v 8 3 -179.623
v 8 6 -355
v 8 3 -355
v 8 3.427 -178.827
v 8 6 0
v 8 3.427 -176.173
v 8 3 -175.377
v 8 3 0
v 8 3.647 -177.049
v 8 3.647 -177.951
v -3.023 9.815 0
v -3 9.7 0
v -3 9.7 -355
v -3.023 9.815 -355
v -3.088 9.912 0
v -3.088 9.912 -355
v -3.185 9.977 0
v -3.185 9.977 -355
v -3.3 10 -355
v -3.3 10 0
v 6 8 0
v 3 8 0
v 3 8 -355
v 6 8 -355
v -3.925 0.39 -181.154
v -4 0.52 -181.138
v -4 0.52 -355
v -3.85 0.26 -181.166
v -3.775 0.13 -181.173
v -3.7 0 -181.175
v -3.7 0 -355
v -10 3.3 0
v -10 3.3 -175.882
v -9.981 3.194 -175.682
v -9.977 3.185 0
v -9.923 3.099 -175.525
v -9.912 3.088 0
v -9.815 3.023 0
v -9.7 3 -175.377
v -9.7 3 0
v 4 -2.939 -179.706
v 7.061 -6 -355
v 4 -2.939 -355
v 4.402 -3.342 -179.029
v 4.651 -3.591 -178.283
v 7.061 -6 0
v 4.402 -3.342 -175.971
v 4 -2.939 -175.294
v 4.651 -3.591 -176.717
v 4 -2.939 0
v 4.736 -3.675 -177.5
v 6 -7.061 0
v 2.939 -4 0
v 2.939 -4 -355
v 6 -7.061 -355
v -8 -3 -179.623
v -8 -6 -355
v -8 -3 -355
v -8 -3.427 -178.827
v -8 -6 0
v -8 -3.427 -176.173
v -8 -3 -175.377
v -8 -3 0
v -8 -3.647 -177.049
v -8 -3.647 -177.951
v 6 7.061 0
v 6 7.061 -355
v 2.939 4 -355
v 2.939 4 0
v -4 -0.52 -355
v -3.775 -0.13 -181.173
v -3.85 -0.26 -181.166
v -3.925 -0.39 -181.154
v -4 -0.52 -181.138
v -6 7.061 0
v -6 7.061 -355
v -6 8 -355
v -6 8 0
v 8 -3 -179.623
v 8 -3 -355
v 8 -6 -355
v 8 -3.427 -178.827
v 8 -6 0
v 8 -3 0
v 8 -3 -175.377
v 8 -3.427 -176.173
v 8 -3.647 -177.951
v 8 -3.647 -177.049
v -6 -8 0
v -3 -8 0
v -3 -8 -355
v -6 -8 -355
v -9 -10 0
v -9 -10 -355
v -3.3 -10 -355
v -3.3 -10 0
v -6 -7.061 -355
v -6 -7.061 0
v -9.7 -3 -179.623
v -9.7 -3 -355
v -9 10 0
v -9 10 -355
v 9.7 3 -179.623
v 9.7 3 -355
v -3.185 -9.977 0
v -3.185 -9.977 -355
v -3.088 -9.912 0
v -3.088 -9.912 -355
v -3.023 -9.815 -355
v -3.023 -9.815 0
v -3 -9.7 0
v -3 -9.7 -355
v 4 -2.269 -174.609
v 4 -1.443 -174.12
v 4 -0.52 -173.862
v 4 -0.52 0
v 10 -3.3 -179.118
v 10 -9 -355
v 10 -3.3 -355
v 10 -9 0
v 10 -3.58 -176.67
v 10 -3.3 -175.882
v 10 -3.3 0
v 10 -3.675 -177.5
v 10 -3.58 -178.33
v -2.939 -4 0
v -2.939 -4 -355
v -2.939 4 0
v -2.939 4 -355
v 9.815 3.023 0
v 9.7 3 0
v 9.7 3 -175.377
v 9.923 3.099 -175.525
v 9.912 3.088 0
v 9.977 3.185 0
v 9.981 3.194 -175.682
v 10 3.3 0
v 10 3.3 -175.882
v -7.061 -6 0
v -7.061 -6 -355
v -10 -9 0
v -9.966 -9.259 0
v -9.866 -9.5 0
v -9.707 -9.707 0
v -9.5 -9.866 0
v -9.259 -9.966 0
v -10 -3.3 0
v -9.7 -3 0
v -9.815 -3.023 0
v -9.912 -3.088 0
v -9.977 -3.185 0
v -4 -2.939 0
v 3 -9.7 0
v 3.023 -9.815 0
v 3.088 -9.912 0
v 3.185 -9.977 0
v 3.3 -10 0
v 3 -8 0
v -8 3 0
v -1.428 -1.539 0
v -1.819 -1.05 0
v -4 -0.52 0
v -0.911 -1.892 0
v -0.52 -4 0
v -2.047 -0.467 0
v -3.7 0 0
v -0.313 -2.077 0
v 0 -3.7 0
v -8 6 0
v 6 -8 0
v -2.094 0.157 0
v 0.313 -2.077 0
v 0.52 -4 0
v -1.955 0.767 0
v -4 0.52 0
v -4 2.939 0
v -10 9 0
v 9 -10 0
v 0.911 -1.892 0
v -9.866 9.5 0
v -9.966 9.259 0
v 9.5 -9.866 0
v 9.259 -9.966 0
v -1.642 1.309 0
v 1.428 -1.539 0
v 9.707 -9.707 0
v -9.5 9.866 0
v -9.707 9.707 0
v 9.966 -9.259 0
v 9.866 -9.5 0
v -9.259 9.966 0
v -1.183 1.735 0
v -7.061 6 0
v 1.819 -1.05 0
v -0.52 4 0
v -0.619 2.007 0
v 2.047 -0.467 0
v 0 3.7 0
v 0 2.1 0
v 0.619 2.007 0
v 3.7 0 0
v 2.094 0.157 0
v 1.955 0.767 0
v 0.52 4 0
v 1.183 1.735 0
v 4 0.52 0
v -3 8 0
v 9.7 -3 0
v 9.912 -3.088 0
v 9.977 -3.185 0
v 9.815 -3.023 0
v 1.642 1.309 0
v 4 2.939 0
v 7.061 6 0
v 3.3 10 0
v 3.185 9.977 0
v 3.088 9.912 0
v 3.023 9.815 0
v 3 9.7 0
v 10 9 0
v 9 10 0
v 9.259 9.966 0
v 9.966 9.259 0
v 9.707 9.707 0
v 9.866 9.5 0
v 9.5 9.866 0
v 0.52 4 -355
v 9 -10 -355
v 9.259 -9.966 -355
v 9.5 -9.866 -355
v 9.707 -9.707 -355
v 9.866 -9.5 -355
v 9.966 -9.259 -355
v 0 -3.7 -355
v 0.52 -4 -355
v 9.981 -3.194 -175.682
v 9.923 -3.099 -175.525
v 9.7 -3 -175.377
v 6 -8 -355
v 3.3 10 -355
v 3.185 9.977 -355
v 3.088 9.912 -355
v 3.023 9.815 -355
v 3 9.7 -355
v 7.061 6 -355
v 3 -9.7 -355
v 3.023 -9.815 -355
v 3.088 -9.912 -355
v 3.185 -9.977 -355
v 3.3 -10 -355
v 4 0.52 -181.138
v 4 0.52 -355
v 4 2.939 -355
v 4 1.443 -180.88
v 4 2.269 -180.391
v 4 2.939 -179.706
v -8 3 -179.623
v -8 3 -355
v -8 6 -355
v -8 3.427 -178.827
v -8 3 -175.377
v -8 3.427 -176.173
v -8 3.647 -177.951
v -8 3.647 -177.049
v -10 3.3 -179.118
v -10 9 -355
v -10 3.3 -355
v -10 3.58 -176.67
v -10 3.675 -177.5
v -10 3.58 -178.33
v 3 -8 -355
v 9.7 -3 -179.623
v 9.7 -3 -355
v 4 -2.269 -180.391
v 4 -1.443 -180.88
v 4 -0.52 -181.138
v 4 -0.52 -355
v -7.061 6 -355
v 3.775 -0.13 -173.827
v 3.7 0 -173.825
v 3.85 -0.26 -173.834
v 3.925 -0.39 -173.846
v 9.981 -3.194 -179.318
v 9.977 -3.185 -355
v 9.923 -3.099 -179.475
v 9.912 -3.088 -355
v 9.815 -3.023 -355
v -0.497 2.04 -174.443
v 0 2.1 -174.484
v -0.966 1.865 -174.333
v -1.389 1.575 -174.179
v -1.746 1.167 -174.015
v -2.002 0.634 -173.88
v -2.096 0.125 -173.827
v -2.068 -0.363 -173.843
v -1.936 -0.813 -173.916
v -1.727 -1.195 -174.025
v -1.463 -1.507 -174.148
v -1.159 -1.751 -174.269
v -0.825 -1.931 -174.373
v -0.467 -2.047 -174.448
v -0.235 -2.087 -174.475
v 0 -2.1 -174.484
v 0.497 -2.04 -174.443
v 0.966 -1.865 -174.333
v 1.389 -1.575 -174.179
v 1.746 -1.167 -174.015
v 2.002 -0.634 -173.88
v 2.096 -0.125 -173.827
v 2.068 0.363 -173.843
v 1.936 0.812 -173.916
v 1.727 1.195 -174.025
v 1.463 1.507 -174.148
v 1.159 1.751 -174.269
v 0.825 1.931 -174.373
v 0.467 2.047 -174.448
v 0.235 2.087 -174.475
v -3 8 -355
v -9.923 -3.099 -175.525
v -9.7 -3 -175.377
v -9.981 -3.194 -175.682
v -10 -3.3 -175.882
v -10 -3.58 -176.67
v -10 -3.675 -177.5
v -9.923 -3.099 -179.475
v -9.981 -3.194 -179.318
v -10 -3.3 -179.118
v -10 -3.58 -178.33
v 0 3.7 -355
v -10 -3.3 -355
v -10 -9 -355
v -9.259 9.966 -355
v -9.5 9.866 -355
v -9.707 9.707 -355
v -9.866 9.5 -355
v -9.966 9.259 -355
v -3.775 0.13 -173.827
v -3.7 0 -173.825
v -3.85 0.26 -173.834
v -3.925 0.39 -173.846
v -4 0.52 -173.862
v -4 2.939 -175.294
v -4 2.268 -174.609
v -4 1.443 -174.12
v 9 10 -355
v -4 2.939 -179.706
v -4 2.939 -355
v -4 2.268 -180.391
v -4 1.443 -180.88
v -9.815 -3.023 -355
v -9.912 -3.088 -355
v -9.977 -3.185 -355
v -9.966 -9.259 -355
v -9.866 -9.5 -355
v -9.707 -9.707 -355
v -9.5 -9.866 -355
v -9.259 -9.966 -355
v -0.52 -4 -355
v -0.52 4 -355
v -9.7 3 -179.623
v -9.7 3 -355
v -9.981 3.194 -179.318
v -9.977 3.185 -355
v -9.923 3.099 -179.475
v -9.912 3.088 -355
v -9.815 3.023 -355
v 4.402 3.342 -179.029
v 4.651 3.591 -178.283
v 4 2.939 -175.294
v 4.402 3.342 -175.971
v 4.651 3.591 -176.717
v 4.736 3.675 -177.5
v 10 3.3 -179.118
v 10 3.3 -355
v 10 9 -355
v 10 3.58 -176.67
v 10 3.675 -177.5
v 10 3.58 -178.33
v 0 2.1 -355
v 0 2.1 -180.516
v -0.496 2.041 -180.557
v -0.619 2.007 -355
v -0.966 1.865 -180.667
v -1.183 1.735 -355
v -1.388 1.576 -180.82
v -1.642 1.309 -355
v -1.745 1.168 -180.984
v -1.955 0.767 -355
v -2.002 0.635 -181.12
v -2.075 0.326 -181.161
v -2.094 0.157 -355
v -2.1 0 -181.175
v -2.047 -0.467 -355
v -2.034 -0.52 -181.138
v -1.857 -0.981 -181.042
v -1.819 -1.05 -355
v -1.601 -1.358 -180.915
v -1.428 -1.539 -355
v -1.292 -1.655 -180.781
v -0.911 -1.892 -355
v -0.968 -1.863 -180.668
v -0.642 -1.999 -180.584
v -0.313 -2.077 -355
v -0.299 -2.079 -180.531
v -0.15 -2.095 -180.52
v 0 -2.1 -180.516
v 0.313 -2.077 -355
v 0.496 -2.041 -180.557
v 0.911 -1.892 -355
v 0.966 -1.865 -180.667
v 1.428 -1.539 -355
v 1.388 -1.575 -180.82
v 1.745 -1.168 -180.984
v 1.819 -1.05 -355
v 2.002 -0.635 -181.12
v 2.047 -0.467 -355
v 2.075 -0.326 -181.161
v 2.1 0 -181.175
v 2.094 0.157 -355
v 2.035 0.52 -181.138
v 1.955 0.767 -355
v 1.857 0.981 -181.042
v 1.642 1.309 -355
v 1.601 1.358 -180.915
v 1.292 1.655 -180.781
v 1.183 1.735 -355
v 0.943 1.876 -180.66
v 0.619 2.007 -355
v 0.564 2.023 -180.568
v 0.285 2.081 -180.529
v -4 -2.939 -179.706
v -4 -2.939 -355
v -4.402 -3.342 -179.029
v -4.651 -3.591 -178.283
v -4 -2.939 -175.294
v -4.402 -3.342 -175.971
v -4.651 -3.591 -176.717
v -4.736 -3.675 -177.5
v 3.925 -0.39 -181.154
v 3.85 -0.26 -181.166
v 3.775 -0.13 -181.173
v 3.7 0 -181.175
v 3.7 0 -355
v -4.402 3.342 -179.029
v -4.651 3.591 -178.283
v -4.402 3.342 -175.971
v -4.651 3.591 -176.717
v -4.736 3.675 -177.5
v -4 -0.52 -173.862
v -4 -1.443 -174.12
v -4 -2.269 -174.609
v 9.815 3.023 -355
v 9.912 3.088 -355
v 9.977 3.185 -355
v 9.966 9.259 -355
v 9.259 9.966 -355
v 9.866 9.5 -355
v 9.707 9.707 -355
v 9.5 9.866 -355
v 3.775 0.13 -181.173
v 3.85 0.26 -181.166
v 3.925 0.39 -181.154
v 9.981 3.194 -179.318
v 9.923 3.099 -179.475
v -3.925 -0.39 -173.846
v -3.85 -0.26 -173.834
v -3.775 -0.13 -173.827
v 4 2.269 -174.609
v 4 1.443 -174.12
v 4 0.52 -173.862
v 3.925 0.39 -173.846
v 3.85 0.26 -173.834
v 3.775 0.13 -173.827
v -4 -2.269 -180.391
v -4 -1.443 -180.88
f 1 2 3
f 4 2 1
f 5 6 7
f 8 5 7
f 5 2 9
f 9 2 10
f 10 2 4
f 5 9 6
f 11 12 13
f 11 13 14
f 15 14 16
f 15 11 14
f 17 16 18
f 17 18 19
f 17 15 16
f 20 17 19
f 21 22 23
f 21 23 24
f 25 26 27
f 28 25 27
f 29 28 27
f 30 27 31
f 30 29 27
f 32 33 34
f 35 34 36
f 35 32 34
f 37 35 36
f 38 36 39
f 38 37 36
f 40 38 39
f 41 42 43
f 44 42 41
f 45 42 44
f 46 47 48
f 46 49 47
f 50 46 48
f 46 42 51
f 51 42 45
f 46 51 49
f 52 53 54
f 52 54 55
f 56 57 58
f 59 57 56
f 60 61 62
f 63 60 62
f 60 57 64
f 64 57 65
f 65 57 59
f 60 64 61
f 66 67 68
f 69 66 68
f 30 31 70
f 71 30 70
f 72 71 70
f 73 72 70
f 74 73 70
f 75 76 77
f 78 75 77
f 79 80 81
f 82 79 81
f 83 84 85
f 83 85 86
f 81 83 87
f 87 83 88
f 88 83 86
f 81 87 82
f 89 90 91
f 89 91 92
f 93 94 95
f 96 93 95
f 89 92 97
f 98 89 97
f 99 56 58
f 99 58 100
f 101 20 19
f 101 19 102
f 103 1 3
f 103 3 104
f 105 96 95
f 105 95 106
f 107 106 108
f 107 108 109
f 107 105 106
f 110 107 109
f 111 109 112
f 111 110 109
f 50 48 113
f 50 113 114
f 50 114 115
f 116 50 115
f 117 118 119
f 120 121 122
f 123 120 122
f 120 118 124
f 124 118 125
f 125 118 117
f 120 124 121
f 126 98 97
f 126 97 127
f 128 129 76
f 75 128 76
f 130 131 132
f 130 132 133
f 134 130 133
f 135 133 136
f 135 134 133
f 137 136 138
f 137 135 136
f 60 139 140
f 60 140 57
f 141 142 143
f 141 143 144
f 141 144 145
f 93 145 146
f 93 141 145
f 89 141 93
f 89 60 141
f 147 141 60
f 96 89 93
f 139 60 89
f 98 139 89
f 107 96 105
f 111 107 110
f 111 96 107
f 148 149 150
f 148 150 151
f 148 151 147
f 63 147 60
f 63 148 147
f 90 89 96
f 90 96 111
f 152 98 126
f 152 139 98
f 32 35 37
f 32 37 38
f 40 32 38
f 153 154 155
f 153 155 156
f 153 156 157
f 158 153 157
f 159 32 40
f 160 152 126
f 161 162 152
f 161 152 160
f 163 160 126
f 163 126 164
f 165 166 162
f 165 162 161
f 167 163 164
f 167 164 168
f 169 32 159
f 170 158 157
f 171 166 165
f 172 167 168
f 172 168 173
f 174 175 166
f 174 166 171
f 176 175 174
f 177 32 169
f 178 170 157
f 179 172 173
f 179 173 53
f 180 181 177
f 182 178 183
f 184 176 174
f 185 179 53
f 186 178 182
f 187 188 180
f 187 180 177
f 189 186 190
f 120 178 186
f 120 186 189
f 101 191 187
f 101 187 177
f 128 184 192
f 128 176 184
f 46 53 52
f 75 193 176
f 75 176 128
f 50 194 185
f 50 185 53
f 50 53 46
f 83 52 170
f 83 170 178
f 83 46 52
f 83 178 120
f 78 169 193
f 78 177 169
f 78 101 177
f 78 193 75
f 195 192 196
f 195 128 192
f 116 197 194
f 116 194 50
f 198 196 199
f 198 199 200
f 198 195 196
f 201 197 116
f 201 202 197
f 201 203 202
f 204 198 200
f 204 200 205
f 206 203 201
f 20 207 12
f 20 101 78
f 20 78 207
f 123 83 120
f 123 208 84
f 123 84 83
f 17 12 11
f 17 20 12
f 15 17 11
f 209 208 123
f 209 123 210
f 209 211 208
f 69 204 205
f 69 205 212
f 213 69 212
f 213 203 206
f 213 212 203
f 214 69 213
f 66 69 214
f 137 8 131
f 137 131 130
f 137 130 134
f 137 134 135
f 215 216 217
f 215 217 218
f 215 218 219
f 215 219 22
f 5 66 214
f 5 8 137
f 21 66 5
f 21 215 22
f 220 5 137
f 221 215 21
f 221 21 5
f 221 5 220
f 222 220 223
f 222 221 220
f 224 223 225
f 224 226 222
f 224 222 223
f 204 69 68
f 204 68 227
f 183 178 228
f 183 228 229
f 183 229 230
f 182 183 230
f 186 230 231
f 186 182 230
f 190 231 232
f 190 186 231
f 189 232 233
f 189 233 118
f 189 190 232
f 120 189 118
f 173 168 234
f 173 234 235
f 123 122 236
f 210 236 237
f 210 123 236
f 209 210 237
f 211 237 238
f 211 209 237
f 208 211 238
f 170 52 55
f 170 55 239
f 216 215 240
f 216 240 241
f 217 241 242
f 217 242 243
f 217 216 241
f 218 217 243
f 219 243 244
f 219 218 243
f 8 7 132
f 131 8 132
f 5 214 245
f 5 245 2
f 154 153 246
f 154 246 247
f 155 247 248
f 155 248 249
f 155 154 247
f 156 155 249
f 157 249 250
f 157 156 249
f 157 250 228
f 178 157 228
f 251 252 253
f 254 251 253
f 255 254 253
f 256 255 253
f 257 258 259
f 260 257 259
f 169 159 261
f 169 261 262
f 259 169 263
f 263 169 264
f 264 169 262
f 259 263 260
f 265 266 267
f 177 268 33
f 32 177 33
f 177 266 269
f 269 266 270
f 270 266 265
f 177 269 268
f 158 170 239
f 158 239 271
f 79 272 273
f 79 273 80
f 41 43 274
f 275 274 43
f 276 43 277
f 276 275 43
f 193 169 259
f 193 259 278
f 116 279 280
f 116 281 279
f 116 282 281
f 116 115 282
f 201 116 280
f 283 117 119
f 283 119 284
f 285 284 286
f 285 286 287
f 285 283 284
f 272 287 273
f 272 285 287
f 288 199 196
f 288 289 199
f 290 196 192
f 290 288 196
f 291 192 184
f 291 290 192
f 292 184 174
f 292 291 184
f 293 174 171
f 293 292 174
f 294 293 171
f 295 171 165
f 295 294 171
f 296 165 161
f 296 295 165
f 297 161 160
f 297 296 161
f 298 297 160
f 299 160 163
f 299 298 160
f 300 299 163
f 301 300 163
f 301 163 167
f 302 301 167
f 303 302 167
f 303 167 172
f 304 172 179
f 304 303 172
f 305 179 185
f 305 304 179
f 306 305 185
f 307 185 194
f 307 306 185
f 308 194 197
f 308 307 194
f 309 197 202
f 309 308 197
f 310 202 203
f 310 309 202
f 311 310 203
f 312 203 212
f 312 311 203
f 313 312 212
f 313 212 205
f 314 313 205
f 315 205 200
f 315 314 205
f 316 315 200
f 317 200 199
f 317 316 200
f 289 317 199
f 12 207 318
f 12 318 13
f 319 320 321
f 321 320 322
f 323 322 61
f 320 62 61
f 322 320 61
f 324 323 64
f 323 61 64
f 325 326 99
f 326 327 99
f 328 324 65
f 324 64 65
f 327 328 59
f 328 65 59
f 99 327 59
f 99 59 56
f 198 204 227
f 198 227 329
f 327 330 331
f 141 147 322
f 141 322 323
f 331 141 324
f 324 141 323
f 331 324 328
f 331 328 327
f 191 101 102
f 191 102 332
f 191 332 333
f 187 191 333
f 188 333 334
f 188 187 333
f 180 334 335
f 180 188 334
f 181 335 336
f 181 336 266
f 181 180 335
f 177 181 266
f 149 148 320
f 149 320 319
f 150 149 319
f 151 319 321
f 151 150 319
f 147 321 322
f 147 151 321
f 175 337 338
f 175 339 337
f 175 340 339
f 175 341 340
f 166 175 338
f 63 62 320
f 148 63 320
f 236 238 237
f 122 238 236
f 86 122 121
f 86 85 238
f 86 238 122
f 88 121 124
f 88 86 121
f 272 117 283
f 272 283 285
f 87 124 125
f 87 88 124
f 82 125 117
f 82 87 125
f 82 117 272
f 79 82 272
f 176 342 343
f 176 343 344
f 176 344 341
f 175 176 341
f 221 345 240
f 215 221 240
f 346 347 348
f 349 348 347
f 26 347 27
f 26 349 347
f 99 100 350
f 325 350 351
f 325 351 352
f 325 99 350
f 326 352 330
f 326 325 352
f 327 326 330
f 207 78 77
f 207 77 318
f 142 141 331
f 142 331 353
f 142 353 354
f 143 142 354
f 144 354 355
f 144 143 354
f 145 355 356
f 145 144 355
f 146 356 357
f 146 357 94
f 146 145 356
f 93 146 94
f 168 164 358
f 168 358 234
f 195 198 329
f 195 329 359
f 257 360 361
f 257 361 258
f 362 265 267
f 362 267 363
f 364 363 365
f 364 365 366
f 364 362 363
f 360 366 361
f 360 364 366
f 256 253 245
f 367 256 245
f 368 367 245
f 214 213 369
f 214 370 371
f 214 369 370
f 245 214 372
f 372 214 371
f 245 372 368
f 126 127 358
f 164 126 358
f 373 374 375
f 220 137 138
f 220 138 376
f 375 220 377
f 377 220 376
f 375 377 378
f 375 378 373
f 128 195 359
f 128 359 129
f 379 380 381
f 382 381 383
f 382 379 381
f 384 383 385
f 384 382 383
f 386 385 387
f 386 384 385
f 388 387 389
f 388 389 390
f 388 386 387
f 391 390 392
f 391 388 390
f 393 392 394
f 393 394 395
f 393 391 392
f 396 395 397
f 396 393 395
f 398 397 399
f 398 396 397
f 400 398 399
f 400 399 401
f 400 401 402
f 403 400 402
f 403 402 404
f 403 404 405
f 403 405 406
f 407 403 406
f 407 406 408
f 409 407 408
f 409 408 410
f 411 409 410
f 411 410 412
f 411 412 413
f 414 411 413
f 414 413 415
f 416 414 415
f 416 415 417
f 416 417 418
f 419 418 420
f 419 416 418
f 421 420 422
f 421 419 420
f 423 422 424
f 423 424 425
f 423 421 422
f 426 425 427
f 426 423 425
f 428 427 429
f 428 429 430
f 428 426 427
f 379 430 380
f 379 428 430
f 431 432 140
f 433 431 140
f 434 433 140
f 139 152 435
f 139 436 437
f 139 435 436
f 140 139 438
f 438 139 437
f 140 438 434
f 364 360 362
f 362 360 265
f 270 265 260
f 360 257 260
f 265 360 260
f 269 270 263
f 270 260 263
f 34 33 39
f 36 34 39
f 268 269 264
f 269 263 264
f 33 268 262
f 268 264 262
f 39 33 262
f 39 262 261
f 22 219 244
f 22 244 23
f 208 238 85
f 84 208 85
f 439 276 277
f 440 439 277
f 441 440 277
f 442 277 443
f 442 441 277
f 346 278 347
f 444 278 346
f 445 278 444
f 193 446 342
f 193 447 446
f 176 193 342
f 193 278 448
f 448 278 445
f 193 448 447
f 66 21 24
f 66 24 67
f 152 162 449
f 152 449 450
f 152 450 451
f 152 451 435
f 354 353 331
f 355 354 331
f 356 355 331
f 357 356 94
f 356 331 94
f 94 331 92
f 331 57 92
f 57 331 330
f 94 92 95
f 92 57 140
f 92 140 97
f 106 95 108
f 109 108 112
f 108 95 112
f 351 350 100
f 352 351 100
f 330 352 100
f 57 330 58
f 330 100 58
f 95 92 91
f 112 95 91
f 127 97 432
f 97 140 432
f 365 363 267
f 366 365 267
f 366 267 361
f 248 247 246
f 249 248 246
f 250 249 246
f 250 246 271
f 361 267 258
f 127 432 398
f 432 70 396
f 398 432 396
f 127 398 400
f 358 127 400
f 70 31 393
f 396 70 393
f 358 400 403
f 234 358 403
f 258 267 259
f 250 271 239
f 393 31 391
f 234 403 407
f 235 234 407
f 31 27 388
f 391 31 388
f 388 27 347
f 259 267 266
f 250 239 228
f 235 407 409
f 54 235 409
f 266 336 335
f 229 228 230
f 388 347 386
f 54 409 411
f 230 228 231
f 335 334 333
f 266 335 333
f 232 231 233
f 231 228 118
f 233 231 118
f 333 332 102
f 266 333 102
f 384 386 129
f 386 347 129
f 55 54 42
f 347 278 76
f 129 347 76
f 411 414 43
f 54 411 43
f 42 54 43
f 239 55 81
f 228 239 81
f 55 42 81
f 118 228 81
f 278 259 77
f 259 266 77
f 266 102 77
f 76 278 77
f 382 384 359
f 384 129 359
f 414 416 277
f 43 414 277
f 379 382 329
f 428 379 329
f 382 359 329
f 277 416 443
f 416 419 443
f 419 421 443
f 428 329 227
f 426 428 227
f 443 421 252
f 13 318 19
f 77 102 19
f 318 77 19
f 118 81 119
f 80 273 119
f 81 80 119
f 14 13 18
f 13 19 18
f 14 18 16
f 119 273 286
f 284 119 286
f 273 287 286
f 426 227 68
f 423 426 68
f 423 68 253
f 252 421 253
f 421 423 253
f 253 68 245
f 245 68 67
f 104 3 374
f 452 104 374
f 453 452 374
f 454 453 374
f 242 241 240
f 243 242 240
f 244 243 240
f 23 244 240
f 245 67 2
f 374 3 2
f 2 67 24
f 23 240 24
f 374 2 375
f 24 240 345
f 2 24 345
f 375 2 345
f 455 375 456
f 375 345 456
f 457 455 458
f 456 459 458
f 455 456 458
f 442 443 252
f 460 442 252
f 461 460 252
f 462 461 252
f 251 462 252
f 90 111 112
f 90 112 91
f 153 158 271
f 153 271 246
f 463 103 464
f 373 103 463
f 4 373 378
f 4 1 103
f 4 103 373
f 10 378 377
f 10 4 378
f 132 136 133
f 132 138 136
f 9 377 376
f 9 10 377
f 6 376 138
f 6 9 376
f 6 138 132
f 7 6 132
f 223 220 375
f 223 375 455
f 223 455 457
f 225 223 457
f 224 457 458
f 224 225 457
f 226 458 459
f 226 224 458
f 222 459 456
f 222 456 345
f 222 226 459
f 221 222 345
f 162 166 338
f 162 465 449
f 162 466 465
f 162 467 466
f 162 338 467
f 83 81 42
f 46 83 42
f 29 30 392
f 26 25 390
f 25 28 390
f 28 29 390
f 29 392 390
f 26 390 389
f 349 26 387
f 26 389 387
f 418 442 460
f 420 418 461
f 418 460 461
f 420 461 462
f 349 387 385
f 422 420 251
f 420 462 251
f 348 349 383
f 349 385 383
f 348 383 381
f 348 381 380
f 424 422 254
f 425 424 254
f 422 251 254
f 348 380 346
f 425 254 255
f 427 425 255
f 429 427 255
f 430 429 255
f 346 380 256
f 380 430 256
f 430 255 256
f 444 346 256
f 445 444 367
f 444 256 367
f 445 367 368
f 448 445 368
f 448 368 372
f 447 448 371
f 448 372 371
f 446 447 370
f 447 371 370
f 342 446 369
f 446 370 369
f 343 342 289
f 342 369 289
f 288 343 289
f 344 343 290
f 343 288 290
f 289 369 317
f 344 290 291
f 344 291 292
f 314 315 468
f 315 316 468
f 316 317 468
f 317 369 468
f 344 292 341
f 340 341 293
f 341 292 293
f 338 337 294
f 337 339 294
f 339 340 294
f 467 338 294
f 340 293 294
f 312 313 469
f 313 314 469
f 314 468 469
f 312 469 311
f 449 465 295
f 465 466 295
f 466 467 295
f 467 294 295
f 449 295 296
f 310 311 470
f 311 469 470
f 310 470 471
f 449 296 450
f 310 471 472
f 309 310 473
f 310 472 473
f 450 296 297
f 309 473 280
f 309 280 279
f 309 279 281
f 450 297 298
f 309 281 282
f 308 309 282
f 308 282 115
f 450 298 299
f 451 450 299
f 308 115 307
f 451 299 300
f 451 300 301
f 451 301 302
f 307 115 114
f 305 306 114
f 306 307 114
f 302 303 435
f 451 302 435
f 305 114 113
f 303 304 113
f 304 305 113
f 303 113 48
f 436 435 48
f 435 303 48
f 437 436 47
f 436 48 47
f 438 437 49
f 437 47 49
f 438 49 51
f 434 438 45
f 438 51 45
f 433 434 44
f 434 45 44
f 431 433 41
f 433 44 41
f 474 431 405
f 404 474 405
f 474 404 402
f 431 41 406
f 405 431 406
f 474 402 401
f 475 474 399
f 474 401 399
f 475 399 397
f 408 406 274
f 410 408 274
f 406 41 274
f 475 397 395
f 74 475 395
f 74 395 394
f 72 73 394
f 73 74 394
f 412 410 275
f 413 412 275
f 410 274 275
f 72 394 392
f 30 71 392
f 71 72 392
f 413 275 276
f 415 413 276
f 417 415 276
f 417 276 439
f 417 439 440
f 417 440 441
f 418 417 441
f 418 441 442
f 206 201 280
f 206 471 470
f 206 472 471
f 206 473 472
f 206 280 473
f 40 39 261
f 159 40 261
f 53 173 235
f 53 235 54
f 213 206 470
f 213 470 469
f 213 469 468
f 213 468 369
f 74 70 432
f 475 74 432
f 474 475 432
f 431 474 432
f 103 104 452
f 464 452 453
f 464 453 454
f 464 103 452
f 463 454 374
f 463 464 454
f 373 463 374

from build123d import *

# Parameters (mm, degrees)
BOSS_EXTRUDE1_DEPTH     = 355
SKETCH2_W               = 355
SKETCH2_H               = 2.1
SKETCH3_R               = 3.6751
CUT_EXTRUDE1_DEPTH      = 10
CUT_EXTRUDE1_DEPTH_BACK = 10


with BuildPart() as part:
    # Sketch1 → Boss-Extrude1 (new body)
    with BuildSketch(Plane.XY):
        with BuildLine():
            Line((-10, 9), (-10, 3.29999995))
            ThreePointArc((-10, 3.29999995), (-9.912132049, 3.087867916), (-9.7, 3))
            Line((-9.7, 3), (-8, 3))
            Line((-8, 3), (-8, 6))
            Line((-8, 6), (-7.060677, 6))
            Line((-7.060677, 6), (-4, 2.93932965))
            Line((-4, 2.93932965), (-4, 0.519615242))
            Line((-4, 0.519615242), (-3.699996283, -6.437e-06))
            Line((-3.699996283, -6.437e-06), (-4, -0.519628117))
            Line((-4, -0.519628117), (-4, -2.93933725))
            Line((-4, -2.93933725), (-7.0606695, -6))
            Line((-7.0606695, -6), (-8, -6))
            Line((-8, -6), (-8, -3))
            Line((-8, -3), (-9.7, -3))
            ThreePointArc((-9.7, -3), (-9.912132049, -3.087867916), (-10, -3.29999995))
            Line((-10, -3.29999995), (-10, -9))
            ThreePointArc((-10, -9), (-9.707106781, -9.707106781), (-9, -10))
            Line((-9, -10), (-3.29999995, -10))
            ThreePointArc((-3.29999995, -10), (-3.087867916, -9.912132049), (-3, -9.7))
            Line((-3, -9.7), (-3, -8))
            Line((-3, -8), (-6, -8))
            Line((-6, -8), (-6, -7.0606515))
            Line((-6, -7.0606515), (-2.9393489, -4))
            Line((-2.9393489, -4), (-0.519615242, -4))
            Line((-0.519615242, -4), (6.437e-06, -3.699996283))
            Line((6.437e-06, -3.699996283), (0.519628117, -4))
            Line((0.519628117, -4), (2.9393227, -4))
            Line((2.9393227, -4), (6, -7.060677))
            Line((6, -7.060677), (6, -8))
            Line((6, -8), (3, -8))
            Line((3, -8), (3, -9.7))
            ThreePointArc((3, -9.7), (3.087867916, -9.912132049), (3.29999995, -10))
            Line((3.29999995, -10), (9, -10))
            ThreePointArc((9, -10), (9.707106781, -9.707106781), (10, -9))
            Line((10, -9), (10, -3.29999995))
            ThreePointArc((10, -3.29999995), (9.912132049, -3.087867916), (9.7, -3))
            Line((9.7, -3), (8, -3))
            Line((8, -3), (8, -6))
            Line((8, -6), (7.0606435, -6))
            Line((7.0606435, -6), (4, -2.9393482))
            Line((4, -2.9393482), (4, -0.519615242))
            Line((4, -0.519615242), (3.699996283, 6.437e-06))
            Line((3.699996283, 6.437e-06), (4, 0.519628117))
            Line((4, 0.519628117), (4, 2.9393401))
            Line((4, 2.9393401), (7.060651, 6))
            Line((7.060651, 6), (8, 6))
            Line((8, 6), (8, 3))
            Line((8, 3), (9.7, 3))
            ThreePointArc((9.7, 3), (9.912132049, 3.087867916), (10, 3.29999995))
            Line((10, 3.29999995), (10, 9))
            ThreePointArc((10, 9), (9.707106781, 9.707106781), (9, 10))
            Line((9, 10), (3.29999995, 10))
            ThreePointArc((3.29999995, 10), (3.087867916, 9.912132049), (3, 9.7))
            Line((3, 9.7), (3, 8))
            Line((3, 8), (6, 8))
            Line((6, 8), (6, 7.060669))
            Line((6, 7.060669), (2.9393308, 4))
            Line((2.9393308, 4), (0.519615242, 4))
            Line((0.519615242, 4), (-6.437e-06, 3.699996283))
            Line((-6.437e-06, 3.699996283), (-0.519628117, 4))
            Line((-0.519628117, 4), (-2.93935655, 4))
            Line((-2.93935655, 4), (-6, 7.0606435))
            Line((-6, 7.0606435), (-6, 8))
            Line((-6, 8), (-3, 8))
            Line((-3, 8), (-3, 9.7))
            ThreePointArc((-3, 9.7), (-3.087867966, 9.912132034), (-3.3, 10))
            Line((-3.3, 10), (-9, 10))
            ThreePointArc((-9, 10), (-9.707106781, 9.707106781), (-10, 9))
        make_face()
    extrude(amount=-BOSS_EXTRUDE1_DEPTH)

    # Sketch2 → Cut-Revolve1 (revolve, cut)
    with BuildSketch(Plane(origin=(0, 0, 0), x_dir=(0, 0, -1), z_dir=(1, 0, 0))):
        with Locations((177.5, 1.05)):
            Rectangle(SKETCH2_W, SKETCH2_H)
    revolve(axis=Axis((0, 0, -355), (0, 0, 1)), mode=Mode.SUBTRACT)

    # Sketch3 → Cut-Extrude1 (cut, two sides)
    with BuildSketch(Plane(origin=(0, 0, 0), x_dir=(0, 0, -1), z_dir=(1, 0, 0))) as cut_extrude1_sk:
        with Locations((177.5, 0)):
            Circle(SKETCH3_R)
    extrude(amount=CUT_EXTRUDE1_DEPTH, mode=Mode.SUBTRACT)
    extrude(cut_extrude1_sk.sketch, amount=-CUT_EXTRUDE1_DEPTH_BACK, mode=Mode.SUBTRACT)


solid = part.part
